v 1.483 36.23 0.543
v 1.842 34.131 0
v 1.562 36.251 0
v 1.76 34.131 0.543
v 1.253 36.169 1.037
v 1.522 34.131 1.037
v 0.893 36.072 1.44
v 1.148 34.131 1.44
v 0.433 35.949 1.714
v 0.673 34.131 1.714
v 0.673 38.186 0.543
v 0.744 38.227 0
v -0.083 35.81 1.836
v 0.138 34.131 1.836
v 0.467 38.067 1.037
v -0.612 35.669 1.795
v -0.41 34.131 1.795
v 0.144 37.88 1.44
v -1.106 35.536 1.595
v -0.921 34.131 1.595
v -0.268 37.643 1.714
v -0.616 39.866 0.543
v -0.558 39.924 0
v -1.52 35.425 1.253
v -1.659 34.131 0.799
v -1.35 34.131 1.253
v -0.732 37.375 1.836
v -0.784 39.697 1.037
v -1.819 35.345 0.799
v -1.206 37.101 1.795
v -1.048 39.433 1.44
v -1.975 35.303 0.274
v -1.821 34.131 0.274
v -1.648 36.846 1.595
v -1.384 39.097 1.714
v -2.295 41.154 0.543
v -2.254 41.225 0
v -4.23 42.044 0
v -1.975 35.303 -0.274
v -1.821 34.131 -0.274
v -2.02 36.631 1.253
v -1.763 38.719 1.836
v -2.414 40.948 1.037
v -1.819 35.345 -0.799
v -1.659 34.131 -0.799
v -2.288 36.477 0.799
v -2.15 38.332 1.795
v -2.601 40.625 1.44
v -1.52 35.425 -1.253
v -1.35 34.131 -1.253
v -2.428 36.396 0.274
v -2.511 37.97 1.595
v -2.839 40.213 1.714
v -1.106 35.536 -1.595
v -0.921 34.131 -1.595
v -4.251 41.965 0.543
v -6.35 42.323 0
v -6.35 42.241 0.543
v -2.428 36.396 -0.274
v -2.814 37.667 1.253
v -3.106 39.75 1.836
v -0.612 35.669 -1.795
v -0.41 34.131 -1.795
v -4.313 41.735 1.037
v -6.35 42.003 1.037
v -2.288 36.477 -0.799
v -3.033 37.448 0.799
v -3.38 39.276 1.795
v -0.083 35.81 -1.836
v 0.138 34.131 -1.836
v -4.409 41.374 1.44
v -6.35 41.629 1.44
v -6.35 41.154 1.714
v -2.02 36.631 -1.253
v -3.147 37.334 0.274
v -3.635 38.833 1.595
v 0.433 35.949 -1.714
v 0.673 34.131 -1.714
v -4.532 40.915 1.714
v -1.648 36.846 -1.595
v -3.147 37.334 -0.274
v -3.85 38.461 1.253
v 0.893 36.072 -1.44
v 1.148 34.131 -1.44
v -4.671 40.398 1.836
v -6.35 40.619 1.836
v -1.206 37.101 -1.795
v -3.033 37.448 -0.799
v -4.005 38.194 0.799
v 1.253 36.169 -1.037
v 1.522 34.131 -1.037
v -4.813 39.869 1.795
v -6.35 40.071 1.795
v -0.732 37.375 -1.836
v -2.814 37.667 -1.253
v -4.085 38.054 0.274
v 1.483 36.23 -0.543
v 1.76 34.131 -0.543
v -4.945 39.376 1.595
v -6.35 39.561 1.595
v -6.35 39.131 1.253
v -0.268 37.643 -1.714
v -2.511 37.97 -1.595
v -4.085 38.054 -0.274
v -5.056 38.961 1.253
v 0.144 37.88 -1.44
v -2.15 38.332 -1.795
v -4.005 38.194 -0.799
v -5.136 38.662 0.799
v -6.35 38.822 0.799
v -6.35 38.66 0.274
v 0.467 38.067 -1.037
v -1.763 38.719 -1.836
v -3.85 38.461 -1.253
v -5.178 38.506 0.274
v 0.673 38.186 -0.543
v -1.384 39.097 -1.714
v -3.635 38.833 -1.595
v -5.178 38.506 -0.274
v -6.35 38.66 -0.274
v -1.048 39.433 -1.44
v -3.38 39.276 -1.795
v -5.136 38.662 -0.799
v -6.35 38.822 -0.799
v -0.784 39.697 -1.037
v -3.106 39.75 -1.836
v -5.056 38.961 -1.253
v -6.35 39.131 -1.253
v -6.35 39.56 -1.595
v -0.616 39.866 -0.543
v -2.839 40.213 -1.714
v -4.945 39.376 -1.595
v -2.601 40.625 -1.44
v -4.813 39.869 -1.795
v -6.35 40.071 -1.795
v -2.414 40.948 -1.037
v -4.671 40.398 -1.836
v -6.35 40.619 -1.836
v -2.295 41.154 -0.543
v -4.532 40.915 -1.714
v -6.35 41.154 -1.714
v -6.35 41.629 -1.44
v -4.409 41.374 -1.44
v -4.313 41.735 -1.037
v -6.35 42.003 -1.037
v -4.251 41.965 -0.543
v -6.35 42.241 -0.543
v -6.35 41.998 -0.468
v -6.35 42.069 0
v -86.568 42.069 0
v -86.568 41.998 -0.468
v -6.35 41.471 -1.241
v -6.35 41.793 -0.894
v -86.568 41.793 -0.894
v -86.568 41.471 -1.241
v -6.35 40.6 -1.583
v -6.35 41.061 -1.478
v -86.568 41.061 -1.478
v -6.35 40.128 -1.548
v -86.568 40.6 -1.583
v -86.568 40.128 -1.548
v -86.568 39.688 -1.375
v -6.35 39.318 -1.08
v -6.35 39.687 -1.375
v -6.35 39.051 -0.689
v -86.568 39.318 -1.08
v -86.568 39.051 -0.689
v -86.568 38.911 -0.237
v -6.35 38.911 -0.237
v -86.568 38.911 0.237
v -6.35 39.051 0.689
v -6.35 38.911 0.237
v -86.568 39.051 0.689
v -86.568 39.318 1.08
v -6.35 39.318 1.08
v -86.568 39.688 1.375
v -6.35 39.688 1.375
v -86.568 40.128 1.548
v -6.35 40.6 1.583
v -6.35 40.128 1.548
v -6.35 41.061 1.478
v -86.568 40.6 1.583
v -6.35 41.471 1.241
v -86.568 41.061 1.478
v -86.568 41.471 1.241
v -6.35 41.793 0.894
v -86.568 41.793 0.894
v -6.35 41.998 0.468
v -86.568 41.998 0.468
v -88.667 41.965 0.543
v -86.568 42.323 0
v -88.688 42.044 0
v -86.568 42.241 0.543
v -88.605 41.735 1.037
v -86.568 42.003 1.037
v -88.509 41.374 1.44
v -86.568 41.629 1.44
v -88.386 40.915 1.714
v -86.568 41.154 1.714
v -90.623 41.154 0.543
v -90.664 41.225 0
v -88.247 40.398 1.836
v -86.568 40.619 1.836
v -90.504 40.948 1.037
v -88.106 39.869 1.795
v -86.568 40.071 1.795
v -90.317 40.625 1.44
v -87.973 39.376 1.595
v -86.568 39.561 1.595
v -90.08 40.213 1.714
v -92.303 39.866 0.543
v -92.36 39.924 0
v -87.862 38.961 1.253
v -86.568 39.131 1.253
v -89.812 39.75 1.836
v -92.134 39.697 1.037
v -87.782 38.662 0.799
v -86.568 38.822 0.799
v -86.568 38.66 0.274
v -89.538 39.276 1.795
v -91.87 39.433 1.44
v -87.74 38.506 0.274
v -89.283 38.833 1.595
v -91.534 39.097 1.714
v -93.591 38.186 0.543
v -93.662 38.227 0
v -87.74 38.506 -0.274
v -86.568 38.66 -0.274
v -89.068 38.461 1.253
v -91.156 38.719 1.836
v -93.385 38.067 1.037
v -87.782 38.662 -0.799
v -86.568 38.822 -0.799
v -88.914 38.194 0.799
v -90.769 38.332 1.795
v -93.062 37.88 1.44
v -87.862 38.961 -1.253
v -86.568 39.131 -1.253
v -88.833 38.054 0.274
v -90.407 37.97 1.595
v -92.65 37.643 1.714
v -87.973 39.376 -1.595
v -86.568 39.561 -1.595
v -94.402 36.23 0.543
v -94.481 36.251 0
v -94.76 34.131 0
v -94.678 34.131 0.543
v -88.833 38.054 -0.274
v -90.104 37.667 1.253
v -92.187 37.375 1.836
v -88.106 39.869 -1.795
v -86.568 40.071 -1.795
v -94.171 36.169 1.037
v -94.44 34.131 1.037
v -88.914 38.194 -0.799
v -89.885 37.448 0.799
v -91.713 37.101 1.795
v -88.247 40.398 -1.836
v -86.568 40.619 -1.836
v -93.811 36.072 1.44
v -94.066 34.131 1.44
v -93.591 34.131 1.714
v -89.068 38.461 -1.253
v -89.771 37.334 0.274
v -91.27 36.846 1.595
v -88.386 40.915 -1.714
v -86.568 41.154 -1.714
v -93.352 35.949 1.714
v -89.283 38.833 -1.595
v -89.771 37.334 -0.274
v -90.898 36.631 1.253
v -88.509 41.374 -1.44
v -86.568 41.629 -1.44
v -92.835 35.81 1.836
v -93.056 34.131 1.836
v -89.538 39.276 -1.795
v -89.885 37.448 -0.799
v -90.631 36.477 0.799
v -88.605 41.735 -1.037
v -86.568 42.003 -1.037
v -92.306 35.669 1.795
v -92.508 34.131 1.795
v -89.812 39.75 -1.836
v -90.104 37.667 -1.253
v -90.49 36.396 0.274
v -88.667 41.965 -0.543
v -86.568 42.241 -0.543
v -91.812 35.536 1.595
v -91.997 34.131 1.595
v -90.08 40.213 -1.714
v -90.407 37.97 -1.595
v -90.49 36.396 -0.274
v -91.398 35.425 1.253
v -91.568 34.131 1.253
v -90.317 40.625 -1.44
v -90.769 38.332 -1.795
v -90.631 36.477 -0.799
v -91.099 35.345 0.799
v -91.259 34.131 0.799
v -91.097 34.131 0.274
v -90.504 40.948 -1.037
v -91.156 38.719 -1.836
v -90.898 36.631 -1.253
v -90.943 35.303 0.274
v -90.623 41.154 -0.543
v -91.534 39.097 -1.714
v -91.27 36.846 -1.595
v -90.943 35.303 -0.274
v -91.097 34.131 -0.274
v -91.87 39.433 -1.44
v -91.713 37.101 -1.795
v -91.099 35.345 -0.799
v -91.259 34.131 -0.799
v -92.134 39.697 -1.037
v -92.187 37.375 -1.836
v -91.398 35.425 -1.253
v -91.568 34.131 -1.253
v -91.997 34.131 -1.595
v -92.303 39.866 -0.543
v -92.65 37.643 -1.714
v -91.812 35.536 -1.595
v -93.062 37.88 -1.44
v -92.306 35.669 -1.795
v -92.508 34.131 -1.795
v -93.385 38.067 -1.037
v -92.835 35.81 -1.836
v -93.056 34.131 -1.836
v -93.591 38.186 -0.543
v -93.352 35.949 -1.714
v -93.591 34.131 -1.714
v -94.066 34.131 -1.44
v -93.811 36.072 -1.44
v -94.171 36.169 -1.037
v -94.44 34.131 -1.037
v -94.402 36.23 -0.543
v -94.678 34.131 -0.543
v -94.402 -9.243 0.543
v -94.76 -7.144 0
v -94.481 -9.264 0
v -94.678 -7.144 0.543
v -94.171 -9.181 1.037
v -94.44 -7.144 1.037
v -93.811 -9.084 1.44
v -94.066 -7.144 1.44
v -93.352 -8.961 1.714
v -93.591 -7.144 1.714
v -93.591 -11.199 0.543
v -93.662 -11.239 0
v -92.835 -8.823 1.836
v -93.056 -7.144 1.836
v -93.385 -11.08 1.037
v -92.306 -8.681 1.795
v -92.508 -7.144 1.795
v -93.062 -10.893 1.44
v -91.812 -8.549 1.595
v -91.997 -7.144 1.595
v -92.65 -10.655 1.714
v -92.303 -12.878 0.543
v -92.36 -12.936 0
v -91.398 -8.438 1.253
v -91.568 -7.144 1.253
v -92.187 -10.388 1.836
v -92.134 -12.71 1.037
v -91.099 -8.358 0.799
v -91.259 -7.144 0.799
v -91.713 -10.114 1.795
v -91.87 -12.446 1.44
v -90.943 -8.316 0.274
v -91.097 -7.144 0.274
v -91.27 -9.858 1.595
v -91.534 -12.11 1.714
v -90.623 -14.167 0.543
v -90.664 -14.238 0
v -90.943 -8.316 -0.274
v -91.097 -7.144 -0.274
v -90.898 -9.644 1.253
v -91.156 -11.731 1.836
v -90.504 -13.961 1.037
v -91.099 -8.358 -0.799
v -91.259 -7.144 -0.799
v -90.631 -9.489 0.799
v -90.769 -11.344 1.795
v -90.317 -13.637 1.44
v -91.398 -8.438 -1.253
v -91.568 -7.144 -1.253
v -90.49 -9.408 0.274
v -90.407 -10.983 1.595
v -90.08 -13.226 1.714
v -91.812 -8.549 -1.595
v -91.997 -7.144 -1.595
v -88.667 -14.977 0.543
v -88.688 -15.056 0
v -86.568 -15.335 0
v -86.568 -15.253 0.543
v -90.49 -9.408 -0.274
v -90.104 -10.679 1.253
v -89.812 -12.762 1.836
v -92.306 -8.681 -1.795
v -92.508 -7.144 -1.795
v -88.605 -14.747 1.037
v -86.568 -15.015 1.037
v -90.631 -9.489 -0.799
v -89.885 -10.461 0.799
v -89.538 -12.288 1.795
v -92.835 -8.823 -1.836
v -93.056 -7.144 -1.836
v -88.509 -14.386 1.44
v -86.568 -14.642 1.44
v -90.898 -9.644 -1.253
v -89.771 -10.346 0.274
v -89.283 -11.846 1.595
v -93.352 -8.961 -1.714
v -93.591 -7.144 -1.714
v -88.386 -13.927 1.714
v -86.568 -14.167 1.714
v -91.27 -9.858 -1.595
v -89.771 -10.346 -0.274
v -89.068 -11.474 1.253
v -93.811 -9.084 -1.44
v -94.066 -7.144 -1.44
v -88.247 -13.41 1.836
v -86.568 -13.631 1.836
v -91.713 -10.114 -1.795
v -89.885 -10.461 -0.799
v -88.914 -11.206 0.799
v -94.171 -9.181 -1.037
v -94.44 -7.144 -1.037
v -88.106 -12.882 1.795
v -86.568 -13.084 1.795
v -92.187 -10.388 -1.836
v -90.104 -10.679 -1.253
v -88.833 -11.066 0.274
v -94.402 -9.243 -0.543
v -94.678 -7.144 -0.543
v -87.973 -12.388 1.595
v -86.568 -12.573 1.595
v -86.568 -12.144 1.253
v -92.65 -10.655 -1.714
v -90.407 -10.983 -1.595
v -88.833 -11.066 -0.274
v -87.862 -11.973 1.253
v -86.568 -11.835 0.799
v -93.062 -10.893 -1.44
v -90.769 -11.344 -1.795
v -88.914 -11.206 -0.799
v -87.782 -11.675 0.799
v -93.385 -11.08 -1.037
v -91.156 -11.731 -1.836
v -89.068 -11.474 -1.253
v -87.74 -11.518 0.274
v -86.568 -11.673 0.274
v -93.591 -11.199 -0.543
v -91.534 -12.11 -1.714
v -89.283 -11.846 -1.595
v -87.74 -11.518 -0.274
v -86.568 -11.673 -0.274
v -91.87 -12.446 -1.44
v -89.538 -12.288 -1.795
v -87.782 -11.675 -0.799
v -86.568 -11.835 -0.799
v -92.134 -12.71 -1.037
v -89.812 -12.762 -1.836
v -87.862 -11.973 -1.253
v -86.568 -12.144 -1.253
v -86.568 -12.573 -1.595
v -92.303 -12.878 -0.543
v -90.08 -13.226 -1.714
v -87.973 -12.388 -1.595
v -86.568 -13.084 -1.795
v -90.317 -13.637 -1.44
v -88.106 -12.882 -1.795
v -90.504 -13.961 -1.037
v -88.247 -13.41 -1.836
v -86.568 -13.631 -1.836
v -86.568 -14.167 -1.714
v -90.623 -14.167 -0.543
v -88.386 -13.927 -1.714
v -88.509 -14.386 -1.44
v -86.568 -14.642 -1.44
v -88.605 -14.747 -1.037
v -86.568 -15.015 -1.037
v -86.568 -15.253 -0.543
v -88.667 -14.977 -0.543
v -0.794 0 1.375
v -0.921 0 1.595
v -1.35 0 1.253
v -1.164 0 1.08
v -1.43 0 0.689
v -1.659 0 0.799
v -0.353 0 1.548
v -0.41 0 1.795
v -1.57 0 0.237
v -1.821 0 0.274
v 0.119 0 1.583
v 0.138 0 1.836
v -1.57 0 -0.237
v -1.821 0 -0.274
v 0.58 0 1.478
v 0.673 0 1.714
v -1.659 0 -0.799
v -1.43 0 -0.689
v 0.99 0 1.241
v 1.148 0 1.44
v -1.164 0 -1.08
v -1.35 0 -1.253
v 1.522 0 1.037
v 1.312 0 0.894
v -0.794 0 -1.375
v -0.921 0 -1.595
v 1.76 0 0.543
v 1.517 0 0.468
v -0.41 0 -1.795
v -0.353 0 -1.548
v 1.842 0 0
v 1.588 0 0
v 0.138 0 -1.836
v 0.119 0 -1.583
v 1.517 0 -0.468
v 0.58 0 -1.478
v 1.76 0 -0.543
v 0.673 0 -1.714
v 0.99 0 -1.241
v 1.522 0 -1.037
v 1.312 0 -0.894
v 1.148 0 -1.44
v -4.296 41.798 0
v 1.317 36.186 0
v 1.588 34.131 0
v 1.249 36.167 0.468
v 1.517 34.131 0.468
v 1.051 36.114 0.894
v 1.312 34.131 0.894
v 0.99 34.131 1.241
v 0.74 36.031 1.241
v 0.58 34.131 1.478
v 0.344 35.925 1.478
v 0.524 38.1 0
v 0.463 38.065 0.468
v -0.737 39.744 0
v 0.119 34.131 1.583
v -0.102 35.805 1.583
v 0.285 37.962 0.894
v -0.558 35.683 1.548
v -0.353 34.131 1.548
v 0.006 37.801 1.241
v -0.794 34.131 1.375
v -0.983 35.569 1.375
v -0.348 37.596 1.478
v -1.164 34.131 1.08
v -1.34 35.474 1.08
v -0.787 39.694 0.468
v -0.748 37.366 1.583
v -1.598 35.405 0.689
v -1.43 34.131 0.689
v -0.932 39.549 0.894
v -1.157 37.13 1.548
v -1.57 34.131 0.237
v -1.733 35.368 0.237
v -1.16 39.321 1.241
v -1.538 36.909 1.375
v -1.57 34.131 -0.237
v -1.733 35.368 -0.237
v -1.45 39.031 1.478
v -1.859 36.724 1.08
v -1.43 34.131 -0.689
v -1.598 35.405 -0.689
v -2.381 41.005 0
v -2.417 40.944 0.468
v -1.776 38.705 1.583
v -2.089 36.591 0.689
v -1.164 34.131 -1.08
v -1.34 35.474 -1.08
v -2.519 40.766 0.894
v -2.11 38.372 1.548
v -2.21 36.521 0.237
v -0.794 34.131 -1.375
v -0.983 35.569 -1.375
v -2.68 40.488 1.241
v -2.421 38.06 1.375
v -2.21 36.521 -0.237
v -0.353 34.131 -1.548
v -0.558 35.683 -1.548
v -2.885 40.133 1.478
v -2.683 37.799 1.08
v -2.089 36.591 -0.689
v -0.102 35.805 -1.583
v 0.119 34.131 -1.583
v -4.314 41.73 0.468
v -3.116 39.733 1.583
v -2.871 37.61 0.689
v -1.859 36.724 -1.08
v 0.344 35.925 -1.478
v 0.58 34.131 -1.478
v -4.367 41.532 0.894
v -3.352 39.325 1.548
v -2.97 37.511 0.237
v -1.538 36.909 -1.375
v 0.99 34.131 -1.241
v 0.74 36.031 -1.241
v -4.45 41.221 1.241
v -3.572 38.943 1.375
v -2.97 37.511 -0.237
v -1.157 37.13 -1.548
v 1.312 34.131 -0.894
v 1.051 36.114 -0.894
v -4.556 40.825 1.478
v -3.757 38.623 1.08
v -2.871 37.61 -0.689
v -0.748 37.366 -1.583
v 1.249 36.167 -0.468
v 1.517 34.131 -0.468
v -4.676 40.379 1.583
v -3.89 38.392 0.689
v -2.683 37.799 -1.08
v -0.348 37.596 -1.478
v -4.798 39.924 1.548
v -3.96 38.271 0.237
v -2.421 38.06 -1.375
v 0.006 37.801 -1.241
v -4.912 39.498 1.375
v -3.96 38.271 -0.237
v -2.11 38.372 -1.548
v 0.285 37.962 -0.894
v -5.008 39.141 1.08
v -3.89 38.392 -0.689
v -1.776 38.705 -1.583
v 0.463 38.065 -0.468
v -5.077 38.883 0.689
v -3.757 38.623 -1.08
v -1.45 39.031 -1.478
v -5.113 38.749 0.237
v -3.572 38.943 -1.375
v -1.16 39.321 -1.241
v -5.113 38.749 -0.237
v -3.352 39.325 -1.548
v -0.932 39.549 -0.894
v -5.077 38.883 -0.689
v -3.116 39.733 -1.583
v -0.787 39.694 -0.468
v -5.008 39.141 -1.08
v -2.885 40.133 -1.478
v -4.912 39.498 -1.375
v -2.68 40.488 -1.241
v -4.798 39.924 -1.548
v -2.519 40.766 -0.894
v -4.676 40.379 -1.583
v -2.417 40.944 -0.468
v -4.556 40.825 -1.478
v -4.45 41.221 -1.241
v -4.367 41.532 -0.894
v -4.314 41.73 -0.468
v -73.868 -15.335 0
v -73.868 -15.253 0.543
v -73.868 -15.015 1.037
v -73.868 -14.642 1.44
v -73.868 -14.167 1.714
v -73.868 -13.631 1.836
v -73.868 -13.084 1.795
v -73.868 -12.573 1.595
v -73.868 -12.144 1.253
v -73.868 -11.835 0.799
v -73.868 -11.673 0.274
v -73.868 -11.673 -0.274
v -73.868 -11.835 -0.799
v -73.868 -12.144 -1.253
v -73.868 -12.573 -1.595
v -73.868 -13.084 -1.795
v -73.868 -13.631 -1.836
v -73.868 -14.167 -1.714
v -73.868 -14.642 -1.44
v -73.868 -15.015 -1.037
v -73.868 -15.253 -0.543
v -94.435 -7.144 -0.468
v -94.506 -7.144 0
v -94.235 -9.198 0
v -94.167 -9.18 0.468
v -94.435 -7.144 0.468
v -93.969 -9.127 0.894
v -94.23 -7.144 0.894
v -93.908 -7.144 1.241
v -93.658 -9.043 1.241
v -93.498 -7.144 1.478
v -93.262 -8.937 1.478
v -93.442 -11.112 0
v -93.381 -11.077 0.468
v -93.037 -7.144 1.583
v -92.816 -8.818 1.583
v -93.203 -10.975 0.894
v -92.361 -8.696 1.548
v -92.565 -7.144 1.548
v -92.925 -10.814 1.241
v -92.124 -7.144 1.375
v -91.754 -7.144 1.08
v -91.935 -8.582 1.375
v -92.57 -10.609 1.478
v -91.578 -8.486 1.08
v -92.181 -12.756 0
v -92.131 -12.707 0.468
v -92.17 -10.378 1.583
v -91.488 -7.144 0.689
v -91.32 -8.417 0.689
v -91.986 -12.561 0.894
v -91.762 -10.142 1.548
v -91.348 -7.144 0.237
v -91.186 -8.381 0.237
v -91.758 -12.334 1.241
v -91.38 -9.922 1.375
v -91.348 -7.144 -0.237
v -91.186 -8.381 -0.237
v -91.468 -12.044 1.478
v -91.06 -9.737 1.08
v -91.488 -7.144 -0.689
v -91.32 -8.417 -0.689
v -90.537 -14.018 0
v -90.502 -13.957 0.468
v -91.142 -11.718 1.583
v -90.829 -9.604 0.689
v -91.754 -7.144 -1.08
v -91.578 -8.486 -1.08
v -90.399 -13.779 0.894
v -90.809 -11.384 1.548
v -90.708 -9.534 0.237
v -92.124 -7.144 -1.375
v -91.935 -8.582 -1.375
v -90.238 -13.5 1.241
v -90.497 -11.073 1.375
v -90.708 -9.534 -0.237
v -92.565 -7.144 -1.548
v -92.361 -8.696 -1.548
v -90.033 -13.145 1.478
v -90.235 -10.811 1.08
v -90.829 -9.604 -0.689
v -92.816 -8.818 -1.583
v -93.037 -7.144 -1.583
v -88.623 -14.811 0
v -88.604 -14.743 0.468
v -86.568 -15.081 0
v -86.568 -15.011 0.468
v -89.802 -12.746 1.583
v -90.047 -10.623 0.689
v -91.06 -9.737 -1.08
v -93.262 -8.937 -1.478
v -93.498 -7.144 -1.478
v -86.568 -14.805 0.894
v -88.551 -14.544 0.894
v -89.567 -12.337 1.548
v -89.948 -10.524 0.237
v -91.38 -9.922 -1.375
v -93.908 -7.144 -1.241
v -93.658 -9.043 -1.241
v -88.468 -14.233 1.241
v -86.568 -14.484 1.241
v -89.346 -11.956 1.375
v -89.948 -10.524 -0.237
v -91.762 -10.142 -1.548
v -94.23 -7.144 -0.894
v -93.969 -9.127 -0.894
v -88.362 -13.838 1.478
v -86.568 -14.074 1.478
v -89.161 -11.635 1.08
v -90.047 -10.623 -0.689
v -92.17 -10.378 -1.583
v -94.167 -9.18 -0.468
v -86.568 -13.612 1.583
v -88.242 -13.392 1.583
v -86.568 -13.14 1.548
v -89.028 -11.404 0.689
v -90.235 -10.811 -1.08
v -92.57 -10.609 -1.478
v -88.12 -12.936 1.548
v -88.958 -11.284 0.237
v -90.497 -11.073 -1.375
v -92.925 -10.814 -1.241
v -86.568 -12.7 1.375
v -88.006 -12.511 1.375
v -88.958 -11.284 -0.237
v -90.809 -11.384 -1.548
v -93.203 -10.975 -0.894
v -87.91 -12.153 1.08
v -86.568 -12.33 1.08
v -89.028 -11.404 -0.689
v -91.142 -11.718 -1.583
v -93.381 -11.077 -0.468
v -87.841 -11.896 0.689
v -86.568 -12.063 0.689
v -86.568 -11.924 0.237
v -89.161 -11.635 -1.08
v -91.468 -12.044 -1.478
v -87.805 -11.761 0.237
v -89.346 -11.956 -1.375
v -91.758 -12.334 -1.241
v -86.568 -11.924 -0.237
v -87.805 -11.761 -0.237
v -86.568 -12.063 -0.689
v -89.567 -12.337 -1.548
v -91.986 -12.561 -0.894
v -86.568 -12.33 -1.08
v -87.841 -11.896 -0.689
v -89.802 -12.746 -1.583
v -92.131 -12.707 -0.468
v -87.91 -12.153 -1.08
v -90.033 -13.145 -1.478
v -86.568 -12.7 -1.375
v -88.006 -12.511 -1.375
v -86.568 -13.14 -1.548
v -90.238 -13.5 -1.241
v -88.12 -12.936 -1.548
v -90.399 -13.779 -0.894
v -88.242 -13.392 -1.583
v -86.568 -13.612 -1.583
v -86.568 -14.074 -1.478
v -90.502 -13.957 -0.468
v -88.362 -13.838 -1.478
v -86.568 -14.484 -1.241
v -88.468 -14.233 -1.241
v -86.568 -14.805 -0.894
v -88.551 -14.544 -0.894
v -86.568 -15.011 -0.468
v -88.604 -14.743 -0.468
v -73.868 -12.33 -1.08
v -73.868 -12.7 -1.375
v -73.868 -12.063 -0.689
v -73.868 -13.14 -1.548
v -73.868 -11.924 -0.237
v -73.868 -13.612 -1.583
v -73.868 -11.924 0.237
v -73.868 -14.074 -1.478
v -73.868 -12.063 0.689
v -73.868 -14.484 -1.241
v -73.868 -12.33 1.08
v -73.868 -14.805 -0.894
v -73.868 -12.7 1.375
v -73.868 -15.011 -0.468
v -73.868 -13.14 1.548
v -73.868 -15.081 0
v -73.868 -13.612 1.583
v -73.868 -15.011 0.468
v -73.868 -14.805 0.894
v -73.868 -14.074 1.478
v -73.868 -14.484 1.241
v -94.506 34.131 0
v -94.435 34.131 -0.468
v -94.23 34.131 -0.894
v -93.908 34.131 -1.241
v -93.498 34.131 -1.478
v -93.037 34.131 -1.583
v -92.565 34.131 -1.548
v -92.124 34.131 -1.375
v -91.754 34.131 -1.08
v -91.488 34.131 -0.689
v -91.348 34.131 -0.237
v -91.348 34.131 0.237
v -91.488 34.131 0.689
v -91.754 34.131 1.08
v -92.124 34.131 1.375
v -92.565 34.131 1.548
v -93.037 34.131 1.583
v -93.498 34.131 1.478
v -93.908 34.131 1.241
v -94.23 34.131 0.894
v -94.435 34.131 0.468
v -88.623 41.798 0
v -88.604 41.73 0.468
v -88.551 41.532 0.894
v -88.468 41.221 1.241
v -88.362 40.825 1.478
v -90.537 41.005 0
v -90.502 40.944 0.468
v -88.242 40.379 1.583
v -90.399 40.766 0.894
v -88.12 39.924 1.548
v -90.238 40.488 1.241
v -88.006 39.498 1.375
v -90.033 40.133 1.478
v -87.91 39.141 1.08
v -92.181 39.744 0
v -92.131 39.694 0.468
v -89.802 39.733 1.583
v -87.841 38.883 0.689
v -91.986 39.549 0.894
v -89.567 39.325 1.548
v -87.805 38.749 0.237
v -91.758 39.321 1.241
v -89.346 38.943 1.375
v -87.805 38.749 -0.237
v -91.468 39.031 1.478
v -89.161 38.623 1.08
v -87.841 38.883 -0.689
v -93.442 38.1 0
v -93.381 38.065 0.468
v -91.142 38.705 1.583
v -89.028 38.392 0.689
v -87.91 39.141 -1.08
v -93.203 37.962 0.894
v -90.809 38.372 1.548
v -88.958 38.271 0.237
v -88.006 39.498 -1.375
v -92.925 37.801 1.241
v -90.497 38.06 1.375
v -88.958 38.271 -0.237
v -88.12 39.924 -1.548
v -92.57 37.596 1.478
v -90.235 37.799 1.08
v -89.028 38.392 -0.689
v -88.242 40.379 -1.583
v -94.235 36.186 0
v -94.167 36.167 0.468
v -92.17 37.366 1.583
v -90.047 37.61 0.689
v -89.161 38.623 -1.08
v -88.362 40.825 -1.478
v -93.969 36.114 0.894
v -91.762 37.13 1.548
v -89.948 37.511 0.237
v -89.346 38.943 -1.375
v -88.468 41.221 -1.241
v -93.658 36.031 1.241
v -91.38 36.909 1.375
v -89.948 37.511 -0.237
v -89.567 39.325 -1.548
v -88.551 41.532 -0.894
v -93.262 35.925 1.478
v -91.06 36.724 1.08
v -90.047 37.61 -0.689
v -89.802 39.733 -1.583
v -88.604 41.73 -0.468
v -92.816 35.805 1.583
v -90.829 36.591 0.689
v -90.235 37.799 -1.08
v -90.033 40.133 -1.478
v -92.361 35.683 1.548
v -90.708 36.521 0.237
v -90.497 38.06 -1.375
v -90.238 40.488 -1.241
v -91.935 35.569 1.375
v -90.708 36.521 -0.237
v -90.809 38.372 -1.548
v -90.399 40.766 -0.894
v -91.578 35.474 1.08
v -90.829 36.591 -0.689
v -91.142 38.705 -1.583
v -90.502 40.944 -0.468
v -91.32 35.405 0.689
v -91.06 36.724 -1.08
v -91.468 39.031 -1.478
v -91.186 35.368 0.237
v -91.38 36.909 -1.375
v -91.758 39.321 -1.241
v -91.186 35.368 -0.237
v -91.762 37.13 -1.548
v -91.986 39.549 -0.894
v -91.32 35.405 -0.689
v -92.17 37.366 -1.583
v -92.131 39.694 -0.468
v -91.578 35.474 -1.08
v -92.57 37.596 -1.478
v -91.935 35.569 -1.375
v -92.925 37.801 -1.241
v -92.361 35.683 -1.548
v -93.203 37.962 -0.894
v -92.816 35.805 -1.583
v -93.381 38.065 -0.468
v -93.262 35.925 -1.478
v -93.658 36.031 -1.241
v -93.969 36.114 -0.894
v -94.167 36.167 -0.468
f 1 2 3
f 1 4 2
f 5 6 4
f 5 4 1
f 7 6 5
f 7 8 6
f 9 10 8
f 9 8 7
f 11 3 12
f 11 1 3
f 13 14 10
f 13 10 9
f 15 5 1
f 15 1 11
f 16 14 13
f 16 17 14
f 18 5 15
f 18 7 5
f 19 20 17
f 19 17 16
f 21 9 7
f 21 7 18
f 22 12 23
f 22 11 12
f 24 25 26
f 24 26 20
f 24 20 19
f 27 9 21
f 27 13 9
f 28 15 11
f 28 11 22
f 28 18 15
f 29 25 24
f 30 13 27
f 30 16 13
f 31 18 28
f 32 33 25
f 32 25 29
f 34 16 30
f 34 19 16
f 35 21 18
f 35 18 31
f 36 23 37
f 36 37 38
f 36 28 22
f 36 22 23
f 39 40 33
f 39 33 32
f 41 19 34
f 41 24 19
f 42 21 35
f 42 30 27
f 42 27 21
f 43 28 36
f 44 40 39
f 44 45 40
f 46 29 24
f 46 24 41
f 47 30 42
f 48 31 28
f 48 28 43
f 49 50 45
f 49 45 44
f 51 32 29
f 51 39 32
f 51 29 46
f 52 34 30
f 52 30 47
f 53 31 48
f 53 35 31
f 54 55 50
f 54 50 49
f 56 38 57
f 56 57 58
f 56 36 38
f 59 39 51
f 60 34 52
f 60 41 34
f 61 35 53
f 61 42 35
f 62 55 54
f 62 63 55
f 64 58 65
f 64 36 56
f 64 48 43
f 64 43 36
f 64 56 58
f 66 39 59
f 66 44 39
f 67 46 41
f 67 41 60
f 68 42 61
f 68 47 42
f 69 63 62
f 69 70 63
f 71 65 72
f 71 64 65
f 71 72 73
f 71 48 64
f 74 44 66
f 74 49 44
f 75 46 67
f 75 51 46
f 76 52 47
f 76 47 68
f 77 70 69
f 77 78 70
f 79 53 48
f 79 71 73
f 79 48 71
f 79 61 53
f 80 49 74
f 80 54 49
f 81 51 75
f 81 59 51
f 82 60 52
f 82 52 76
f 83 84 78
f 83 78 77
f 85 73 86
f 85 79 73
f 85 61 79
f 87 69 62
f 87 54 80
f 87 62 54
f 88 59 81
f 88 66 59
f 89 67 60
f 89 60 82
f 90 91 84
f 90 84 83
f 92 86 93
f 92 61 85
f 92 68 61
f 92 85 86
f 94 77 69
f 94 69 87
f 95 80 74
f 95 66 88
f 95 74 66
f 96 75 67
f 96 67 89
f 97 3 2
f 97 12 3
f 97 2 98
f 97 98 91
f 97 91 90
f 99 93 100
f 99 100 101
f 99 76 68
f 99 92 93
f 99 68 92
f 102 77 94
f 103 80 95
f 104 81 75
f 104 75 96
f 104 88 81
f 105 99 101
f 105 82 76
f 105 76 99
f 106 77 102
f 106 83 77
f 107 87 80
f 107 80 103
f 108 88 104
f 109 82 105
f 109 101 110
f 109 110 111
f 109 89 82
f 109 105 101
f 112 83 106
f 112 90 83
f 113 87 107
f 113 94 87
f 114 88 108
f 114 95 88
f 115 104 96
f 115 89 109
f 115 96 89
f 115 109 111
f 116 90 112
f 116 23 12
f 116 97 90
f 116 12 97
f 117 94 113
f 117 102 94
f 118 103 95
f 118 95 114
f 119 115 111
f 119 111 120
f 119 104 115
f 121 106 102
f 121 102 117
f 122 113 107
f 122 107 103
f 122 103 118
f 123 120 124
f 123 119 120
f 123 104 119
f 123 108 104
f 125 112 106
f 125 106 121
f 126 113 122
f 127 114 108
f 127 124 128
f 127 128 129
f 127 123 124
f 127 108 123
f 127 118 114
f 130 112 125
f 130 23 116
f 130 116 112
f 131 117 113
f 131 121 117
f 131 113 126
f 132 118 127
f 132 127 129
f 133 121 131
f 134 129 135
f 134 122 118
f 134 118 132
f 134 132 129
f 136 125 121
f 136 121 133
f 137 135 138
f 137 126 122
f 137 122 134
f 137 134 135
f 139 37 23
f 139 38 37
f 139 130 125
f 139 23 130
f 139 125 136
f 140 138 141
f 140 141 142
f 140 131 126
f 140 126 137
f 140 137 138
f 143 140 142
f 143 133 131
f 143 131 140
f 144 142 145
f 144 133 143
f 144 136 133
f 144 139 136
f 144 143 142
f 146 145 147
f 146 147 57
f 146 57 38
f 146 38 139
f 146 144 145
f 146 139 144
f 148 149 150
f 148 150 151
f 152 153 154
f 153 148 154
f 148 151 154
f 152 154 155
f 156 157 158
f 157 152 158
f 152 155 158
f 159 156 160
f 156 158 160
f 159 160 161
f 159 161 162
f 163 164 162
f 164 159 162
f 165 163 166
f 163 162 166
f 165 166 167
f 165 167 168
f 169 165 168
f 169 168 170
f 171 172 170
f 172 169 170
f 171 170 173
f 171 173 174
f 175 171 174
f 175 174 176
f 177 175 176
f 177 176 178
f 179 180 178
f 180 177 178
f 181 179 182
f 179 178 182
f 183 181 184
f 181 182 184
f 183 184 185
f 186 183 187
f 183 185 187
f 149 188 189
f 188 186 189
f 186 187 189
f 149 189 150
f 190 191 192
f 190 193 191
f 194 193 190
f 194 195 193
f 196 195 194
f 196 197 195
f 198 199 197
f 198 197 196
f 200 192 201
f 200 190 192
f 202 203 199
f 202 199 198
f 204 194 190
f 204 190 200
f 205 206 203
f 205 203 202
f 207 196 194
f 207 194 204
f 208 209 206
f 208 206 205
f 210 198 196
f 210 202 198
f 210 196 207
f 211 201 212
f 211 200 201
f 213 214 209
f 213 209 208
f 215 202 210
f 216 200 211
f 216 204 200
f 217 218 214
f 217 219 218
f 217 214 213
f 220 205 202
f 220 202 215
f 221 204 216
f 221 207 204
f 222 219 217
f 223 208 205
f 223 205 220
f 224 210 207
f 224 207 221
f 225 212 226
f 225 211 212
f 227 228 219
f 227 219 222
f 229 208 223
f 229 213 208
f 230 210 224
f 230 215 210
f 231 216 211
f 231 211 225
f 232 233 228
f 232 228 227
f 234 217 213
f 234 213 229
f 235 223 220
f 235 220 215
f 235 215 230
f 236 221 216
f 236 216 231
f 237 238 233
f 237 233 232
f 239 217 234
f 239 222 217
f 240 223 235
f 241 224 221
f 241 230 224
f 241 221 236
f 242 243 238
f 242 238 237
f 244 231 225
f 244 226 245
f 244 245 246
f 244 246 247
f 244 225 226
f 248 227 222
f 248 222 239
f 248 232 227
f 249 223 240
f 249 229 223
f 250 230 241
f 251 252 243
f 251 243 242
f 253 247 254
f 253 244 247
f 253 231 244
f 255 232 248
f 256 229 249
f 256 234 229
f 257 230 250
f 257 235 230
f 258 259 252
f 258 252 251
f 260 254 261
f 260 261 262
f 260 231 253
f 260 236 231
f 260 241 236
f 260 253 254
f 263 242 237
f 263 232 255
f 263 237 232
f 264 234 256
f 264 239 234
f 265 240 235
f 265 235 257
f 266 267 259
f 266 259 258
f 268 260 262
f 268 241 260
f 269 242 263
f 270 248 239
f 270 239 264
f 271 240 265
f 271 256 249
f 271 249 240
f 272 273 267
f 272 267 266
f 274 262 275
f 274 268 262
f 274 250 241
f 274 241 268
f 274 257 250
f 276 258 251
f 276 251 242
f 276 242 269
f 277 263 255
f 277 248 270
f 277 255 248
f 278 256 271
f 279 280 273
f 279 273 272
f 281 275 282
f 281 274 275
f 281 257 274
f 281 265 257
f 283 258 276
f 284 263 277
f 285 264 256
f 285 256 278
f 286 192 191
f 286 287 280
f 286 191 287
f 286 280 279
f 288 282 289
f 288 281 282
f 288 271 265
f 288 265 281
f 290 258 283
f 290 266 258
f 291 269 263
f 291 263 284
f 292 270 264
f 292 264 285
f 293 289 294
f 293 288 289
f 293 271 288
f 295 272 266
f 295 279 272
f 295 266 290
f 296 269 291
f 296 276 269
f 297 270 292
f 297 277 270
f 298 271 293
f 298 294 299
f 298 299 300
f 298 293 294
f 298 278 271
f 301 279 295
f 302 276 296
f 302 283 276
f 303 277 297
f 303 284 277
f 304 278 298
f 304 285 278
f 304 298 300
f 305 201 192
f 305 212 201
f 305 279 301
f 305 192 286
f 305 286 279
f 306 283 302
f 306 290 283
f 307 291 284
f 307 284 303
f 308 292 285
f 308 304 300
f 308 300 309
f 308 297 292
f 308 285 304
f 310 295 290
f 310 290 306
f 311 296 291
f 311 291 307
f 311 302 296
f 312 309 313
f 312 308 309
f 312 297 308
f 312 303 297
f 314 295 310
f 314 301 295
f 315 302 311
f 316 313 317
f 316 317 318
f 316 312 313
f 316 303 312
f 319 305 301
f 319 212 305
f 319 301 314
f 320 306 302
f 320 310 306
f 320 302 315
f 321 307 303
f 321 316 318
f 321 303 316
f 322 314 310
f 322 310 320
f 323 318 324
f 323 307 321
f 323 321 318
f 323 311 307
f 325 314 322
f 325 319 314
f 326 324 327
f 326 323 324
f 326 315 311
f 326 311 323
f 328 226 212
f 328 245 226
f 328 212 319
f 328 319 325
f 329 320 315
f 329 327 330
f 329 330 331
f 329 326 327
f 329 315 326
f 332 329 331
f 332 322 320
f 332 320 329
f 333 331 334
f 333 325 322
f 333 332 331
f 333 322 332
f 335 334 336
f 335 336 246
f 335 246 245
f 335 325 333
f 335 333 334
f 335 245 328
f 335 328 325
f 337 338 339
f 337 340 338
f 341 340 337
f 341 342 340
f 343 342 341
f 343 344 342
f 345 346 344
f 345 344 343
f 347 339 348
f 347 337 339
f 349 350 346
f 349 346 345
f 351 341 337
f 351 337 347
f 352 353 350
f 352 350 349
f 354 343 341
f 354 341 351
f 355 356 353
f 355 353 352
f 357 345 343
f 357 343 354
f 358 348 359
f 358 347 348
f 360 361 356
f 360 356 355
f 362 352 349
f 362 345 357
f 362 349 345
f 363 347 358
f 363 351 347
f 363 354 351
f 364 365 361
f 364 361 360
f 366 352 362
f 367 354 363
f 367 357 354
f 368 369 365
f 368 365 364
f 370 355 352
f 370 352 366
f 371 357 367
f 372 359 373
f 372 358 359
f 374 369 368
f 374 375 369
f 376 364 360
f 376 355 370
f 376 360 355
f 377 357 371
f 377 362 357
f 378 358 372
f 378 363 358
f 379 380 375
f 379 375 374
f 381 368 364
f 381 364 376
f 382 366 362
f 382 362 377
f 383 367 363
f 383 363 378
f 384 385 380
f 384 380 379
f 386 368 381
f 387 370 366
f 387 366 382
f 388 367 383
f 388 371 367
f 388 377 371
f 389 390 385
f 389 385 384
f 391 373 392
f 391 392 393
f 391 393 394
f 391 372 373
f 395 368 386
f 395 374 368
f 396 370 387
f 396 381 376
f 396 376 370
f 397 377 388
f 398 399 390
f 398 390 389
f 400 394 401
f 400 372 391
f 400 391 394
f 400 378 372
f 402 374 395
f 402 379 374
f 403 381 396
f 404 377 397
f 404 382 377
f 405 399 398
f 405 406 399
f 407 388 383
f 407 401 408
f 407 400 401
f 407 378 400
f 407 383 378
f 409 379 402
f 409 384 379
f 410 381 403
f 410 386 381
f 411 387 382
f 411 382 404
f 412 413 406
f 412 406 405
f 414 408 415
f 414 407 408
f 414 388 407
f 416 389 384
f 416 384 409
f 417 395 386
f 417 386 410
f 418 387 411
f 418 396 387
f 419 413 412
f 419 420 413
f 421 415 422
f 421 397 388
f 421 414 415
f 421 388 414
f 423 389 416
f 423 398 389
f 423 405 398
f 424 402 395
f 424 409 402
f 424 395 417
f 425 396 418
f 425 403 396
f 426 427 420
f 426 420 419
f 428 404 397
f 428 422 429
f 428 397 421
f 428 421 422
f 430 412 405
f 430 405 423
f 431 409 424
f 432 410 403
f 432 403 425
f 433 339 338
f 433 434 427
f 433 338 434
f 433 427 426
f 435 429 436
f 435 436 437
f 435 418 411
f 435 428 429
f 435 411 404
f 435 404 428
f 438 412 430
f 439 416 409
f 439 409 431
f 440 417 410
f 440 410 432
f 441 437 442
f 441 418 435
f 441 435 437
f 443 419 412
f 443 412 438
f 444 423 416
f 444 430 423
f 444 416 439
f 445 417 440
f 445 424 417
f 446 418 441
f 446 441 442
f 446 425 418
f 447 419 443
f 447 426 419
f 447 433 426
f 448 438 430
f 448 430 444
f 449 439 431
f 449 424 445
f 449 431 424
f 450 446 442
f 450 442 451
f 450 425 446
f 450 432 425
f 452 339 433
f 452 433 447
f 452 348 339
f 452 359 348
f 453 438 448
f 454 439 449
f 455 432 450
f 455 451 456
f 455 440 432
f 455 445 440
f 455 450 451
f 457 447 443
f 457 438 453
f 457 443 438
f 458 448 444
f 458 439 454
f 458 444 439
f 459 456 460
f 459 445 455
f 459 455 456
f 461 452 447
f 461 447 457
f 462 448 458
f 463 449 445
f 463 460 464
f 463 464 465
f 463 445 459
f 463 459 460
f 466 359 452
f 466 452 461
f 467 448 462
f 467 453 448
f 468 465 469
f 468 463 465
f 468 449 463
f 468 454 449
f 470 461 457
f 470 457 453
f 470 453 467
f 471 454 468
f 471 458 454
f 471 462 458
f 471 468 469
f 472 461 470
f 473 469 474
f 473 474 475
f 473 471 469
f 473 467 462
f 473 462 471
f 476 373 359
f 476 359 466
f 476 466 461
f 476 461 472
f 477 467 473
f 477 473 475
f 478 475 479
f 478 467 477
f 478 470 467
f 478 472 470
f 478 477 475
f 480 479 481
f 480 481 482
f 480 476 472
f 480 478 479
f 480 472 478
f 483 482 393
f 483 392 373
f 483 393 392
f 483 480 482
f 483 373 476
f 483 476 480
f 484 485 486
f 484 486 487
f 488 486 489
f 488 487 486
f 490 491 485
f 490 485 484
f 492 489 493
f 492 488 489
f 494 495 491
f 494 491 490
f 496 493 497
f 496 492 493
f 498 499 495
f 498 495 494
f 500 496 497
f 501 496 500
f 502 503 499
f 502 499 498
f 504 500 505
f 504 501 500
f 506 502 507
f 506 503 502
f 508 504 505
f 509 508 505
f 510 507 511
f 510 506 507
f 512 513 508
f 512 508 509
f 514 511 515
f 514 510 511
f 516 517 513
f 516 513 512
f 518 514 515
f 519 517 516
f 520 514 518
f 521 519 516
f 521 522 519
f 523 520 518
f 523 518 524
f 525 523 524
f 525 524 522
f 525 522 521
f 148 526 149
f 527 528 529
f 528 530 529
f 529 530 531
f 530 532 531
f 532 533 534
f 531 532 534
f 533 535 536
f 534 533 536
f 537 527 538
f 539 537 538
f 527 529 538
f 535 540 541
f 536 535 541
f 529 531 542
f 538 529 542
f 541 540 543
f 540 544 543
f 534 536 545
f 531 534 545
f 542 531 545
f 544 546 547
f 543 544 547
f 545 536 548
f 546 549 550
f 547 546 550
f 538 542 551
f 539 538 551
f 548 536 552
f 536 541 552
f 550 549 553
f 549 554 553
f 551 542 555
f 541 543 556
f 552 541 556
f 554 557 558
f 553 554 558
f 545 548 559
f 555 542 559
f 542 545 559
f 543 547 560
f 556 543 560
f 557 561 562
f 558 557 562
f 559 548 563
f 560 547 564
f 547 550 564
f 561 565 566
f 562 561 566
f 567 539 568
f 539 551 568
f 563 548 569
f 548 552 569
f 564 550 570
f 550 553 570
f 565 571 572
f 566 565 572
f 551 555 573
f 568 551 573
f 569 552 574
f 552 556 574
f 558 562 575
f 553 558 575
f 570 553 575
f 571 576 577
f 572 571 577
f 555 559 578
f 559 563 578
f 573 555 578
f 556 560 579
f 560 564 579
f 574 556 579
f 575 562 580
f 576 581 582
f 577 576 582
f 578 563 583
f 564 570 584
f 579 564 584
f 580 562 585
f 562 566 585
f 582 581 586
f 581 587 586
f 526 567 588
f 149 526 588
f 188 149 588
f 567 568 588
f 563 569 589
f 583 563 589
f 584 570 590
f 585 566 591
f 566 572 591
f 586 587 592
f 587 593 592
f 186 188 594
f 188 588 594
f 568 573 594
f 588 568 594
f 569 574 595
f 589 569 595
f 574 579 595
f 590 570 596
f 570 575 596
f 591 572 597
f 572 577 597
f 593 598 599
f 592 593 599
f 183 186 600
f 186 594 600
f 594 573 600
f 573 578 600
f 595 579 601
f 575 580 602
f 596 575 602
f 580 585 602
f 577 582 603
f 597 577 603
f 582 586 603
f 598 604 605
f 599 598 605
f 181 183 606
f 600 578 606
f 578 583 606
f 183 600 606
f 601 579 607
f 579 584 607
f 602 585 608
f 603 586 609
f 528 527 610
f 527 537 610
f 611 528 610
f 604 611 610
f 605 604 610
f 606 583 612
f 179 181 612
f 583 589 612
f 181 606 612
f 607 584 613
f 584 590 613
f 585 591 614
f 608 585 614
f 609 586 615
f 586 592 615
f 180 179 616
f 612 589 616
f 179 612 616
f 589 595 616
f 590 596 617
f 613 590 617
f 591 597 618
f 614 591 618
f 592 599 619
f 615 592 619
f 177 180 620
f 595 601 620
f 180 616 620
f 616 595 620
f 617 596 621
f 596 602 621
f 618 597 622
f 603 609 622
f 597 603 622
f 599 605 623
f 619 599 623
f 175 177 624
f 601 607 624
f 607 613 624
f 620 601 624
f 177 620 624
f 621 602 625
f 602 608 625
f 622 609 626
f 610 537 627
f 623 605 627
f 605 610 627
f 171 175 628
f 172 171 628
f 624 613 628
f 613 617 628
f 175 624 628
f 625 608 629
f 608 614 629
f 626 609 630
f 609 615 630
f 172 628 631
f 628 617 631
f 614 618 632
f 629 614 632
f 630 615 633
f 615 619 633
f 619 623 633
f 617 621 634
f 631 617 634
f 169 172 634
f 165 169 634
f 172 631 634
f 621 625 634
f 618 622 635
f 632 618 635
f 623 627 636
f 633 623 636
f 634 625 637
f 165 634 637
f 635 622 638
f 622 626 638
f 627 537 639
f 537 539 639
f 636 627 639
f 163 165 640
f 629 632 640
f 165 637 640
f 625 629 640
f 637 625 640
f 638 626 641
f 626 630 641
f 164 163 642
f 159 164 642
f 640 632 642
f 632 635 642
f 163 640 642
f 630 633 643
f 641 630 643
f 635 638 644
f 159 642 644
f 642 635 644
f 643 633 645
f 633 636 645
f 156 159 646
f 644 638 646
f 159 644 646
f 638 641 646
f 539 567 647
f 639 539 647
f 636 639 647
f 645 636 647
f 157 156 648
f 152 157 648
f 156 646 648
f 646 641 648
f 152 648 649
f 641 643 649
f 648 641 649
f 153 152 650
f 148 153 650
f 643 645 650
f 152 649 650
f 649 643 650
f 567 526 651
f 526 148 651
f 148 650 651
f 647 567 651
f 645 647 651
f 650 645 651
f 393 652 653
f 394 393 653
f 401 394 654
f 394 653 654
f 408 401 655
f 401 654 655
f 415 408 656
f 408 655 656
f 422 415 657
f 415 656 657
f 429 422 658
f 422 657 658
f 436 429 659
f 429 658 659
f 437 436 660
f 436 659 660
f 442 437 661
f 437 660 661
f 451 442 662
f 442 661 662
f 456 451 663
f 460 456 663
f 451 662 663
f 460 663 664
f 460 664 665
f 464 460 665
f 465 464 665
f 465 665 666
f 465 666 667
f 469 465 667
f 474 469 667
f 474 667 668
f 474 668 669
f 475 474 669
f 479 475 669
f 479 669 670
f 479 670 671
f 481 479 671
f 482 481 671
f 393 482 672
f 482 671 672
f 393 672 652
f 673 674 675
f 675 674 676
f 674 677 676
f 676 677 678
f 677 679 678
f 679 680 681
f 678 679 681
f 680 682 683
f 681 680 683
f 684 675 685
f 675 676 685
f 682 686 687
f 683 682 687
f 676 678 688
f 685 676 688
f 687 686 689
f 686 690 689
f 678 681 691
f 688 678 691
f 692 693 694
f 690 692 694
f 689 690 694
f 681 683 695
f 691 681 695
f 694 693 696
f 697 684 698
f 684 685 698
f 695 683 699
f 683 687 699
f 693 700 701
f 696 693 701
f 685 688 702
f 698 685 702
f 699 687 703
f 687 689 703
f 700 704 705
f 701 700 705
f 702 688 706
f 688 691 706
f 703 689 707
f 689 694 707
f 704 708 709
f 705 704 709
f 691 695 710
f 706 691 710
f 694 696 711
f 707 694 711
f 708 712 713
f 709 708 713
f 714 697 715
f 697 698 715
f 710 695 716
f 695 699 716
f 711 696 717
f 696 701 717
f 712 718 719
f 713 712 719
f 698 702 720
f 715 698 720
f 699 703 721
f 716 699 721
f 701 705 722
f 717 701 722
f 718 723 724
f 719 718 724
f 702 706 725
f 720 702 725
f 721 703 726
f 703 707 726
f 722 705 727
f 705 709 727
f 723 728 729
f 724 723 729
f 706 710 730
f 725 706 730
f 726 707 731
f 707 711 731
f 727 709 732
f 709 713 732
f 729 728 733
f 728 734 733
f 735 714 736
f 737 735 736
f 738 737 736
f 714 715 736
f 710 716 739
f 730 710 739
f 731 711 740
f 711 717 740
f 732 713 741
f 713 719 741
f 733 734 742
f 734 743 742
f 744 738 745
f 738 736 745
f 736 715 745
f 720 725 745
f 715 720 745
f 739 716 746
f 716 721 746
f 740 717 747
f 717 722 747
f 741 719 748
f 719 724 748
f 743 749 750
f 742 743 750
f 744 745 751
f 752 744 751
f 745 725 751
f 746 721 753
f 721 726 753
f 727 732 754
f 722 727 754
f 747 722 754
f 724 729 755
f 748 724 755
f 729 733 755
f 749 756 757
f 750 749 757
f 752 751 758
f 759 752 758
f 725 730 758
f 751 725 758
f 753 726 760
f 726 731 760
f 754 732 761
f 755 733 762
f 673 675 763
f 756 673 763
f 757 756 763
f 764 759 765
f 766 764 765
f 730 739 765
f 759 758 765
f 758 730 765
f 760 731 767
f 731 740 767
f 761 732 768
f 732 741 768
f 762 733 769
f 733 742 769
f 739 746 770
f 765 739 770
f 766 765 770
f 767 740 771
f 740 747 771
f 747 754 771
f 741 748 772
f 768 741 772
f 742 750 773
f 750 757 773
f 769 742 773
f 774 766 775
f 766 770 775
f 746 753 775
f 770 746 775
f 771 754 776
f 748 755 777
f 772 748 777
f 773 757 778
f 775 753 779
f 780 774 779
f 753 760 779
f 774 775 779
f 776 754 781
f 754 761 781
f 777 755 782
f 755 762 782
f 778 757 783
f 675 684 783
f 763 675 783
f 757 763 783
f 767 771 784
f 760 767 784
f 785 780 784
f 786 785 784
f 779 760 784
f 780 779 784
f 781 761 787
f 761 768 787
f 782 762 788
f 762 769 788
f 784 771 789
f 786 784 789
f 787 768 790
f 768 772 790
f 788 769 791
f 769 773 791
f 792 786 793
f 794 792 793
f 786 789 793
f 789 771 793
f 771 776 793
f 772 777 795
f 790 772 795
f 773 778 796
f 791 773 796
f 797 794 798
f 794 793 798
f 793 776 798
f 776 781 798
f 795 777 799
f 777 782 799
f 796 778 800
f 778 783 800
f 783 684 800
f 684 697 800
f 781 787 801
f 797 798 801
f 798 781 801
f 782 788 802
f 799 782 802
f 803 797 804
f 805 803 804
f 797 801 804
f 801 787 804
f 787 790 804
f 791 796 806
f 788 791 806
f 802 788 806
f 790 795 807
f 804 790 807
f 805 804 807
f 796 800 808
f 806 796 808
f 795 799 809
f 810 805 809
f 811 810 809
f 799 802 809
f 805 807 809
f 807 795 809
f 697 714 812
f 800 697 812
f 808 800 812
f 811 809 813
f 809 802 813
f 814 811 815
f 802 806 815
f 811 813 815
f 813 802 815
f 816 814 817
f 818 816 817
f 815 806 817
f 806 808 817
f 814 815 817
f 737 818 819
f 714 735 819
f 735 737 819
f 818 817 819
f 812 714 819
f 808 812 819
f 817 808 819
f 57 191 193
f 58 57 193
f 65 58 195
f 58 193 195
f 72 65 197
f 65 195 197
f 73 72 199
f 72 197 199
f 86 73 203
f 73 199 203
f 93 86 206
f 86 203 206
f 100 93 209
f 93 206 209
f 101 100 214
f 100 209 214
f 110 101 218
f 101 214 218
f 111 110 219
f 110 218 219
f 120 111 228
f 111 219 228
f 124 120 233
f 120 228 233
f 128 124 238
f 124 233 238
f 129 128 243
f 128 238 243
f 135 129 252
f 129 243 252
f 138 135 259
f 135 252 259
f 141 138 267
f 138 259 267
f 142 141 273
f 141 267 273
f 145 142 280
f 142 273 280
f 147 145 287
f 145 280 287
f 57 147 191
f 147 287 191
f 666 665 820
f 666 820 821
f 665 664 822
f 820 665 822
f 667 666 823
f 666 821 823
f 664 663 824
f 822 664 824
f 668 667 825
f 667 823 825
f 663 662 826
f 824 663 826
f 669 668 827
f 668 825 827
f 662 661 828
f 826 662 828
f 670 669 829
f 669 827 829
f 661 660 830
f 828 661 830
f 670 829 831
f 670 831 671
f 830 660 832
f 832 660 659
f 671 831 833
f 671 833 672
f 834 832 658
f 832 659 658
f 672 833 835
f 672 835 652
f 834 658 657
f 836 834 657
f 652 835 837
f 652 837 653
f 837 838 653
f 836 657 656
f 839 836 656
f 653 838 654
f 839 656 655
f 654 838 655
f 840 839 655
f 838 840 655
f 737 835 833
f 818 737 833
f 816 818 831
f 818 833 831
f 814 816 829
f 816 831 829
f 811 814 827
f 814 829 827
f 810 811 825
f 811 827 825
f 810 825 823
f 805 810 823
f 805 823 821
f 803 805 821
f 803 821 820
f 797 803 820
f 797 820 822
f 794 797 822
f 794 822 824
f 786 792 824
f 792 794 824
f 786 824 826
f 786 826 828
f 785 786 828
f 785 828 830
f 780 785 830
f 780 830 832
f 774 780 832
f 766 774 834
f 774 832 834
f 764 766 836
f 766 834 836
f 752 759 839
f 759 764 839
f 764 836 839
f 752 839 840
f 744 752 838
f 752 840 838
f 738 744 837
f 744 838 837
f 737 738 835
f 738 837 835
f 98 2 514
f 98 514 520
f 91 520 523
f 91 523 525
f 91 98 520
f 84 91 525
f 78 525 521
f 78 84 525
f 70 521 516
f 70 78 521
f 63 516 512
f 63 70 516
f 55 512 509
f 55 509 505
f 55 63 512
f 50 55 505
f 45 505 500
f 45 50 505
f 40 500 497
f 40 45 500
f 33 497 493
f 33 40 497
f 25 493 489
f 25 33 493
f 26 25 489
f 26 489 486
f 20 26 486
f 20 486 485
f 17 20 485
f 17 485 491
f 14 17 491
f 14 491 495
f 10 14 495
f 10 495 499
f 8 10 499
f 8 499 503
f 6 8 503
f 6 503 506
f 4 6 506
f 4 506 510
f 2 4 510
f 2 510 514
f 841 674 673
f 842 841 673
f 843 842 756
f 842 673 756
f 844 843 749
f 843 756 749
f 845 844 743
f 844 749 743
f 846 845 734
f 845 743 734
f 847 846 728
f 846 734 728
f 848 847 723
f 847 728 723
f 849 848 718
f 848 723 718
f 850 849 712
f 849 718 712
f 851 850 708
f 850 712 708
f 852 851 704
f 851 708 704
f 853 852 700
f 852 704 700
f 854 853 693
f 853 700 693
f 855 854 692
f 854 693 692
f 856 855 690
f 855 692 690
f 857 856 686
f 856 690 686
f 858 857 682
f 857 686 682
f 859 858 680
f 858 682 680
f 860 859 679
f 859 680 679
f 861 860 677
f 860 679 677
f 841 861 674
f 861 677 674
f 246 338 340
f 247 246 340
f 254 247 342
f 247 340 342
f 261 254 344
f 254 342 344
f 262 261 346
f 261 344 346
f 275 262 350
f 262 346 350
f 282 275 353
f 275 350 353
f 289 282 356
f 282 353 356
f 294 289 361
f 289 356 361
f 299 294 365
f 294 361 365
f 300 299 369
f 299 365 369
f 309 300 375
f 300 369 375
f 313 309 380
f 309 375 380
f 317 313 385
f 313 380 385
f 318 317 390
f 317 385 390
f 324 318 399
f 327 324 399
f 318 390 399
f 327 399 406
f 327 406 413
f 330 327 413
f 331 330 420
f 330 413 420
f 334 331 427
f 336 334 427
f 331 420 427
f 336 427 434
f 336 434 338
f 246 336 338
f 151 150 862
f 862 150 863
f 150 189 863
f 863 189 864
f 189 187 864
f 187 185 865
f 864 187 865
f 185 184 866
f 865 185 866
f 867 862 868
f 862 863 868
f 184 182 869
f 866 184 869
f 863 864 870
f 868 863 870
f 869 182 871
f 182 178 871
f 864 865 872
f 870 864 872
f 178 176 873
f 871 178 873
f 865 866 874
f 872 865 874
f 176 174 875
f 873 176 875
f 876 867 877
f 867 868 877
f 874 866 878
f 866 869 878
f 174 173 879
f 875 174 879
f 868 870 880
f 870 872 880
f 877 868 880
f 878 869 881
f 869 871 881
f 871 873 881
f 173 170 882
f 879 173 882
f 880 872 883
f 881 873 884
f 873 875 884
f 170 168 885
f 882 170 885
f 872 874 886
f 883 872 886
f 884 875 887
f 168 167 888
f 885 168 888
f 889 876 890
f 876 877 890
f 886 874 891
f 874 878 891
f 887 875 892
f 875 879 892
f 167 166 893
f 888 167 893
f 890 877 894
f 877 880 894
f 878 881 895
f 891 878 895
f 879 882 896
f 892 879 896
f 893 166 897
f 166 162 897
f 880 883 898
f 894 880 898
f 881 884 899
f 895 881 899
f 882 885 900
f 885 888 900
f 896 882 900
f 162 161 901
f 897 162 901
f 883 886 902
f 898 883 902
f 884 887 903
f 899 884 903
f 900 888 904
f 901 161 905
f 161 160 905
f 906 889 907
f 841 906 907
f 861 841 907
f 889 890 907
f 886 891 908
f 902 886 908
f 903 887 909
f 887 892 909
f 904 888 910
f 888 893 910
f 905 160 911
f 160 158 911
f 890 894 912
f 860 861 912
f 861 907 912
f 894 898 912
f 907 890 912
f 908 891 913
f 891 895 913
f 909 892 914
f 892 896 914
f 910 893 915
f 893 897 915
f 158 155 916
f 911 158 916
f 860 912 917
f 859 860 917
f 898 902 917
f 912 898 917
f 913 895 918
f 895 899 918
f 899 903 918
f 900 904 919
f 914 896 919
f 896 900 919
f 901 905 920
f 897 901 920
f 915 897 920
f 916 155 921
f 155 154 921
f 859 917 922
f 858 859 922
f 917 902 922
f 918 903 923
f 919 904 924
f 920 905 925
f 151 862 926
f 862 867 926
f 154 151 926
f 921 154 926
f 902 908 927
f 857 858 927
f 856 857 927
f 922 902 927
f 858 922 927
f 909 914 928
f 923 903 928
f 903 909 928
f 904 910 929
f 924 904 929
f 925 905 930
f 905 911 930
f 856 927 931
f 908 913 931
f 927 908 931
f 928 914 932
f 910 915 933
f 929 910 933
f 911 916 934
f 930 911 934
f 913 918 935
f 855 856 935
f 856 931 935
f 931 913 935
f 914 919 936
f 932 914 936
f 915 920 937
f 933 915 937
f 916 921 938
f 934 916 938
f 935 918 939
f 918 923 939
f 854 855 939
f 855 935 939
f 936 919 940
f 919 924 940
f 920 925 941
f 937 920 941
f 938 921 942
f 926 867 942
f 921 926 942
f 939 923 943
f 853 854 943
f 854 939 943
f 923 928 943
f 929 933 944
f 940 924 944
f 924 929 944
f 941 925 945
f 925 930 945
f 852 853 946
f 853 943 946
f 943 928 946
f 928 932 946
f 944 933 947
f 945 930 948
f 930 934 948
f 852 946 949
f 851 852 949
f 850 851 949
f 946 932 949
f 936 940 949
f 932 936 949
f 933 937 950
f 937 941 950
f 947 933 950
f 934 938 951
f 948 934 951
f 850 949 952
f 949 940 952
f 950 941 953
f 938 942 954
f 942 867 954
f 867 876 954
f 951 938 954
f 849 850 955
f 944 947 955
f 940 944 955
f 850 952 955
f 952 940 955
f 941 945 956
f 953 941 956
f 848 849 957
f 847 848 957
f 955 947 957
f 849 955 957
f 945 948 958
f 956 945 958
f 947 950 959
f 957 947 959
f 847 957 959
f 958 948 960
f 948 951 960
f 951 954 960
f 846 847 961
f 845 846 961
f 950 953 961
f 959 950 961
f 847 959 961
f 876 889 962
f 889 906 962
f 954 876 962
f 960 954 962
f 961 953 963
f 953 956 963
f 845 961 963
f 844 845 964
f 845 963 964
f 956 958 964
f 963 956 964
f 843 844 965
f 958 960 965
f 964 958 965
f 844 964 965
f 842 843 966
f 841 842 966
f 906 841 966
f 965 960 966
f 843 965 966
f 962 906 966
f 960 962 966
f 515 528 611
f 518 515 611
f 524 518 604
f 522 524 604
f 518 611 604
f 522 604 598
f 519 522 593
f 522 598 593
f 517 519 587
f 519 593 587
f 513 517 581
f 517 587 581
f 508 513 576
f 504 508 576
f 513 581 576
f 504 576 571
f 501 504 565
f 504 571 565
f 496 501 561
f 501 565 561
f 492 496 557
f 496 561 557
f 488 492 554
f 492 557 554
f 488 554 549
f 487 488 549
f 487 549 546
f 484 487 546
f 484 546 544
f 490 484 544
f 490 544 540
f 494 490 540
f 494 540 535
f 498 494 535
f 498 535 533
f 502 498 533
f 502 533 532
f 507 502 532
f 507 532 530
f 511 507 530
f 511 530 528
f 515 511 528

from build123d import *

# Parameters (mm, degrees)
F1_R   = 1.8415
F1_R_2 = 1.5875


with BuildPart() as f2:
    # F2: sweep along a path in F0
    with BuildLine(Plane.XY) as f2_path:
        Line((0, 0), (0, 34.13125))
        ThreePointArc((0, 34.13125), (-1.859872, 38.621378), (-6.35, 40.48125))
        Line((-6.35, 40.48125), (-86.568178, 40.48125))
        ThreePointArc((-86.568178, 40.48125), (-91.058306, 38.621378), (-92.918178, 34.13125))
        Line((-92.918178, 34.13125), (-92.918178, -7.14375))
        ThreePointArc((-92.918178, -7.14375), (-91.058306, -11.633878), (-86.568178, -13.49375))
        Line((-86.568178, -13.49375), (-73.868178, -13.49375))
    # F1 (on Front) → F2 (sweep)
    with BuildSketch(Plane.XZ):
        Circle(F1_R)
        Circle(F1_R_2, mode=Mode.SUBTRACT)
    sweep(path=f2_path.line)


solid = f2.part
